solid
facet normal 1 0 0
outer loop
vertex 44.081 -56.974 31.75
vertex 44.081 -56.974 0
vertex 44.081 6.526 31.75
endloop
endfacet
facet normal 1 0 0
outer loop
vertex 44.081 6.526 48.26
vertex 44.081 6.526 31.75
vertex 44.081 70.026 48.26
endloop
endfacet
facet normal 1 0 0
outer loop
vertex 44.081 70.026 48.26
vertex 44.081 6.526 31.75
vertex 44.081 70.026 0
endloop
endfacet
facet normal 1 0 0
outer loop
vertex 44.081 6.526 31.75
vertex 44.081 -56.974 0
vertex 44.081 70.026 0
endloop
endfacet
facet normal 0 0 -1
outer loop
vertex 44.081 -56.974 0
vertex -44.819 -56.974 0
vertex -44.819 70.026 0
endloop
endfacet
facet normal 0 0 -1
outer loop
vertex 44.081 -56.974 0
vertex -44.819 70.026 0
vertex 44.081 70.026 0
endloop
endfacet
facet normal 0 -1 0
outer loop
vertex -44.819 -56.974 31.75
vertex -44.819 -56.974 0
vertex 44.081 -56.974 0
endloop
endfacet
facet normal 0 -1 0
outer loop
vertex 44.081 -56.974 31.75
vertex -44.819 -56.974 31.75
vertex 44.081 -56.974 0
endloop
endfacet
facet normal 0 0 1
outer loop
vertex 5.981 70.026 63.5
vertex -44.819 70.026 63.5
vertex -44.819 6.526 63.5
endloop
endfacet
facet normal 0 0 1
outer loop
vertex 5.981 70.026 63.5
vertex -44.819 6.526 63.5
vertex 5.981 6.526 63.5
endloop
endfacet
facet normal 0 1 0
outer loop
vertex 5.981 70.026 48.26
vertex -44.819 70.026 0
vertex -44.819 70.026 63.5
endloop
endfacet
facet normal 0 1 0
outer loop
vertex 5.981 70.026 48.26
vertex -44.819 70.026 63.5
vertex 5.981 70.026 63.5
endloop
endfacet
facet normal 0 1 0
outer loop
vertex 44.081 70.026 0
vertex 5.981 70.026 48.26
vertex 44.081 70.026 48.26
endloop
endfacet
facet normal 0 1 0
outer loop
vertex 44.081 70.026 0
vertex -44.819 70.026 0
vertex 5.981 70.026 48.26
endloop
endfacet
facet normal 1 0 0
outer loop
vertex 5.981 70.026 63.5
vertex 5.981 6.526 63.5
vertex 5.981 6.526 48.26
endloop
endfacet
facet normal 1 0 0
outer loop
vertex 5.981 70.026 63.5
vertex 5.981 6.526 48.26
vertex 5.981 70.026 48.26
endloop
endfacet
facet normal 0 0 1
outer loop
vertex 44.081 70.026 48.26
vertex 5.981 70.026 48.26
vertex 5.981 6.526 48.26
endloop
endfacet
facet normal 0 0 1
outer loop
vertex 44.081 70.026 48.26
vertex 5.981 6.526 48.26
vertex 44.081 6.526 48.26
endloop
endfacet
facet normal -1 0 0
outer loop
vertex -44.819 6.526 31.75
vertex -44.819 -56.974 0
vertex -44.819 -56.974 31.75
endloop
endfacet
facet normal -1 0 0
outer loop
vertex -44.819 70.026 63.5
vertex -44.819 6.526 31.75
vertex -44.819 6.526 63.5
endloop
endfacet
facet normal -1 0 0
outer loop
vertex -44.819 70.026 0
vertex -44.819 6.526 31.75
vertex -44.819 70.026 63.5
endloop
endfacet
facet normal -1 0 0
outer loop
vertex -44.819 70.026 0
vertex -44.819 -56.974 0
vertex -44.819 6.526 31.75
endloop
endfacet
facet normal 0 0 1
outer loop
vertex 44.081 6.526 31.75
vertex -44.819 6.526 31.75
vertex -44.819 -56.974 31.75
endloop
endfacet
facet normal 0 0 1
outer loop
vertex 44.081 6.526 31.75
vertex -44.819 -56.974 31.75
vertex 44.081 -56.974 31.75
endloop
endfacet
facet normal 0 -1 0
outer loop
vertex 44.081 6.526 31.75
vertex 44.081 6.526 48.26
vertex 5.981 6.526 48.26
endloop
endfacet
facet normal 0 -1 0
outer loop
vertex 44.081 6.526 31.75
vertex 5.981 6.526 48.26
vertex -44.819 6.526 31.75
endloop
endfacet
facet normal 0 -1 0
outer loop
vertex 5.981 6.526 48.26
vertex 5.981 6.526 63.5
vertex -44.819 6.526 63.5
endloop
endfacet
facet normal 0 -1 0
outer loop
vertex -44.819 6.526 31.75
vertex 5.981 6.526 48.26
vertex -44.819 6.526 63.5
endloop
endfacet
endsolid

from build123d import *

# Parameters (mm, degrees)
F0_W     = 88.9
F0_H     = 127
F1_DEPTH = 63.5
F2_W     = 38.1
F2_H     = 63.5
F3_DEPTH = 15.24
F5_DEPTH = 31.75


with BuildPart() as f1:
    # F0 (on Top) → F1 (new body)
    with BuildSketch(Plane.XY):
        with Locations((-0.36866225, 6.5260546505)):
            Rectangle(F0_W, F0_H)
    extrude(amount=F1_DEPTH)

    # F2 (on face) → F3 (cut)
    with BuildSketch(Plane.XY.offset(63.5)):
        with Locations((25.03133775, 38.2760546505)):
            Rectangle(F2_W, F2_H)
    extrude(amount=-F3_DEPTH, mode=Mode.SUBTRACT)

    # F4 (on face) → F5 (cut)
    with BuildSketch(Plane.XY.offset(63.5)):
        Polygon((44.08133775, 6.5260546505), (5.98133775, 6.5260546505), (-44.81866225, 6.5260546505), (-44.81866225, -56.9739453495), (44.08133775, -56.9739453495), align=None)
    extrude(amount=-F5_DEPTH, mode=Mode.SUBTRACT)


solid = f1.part
